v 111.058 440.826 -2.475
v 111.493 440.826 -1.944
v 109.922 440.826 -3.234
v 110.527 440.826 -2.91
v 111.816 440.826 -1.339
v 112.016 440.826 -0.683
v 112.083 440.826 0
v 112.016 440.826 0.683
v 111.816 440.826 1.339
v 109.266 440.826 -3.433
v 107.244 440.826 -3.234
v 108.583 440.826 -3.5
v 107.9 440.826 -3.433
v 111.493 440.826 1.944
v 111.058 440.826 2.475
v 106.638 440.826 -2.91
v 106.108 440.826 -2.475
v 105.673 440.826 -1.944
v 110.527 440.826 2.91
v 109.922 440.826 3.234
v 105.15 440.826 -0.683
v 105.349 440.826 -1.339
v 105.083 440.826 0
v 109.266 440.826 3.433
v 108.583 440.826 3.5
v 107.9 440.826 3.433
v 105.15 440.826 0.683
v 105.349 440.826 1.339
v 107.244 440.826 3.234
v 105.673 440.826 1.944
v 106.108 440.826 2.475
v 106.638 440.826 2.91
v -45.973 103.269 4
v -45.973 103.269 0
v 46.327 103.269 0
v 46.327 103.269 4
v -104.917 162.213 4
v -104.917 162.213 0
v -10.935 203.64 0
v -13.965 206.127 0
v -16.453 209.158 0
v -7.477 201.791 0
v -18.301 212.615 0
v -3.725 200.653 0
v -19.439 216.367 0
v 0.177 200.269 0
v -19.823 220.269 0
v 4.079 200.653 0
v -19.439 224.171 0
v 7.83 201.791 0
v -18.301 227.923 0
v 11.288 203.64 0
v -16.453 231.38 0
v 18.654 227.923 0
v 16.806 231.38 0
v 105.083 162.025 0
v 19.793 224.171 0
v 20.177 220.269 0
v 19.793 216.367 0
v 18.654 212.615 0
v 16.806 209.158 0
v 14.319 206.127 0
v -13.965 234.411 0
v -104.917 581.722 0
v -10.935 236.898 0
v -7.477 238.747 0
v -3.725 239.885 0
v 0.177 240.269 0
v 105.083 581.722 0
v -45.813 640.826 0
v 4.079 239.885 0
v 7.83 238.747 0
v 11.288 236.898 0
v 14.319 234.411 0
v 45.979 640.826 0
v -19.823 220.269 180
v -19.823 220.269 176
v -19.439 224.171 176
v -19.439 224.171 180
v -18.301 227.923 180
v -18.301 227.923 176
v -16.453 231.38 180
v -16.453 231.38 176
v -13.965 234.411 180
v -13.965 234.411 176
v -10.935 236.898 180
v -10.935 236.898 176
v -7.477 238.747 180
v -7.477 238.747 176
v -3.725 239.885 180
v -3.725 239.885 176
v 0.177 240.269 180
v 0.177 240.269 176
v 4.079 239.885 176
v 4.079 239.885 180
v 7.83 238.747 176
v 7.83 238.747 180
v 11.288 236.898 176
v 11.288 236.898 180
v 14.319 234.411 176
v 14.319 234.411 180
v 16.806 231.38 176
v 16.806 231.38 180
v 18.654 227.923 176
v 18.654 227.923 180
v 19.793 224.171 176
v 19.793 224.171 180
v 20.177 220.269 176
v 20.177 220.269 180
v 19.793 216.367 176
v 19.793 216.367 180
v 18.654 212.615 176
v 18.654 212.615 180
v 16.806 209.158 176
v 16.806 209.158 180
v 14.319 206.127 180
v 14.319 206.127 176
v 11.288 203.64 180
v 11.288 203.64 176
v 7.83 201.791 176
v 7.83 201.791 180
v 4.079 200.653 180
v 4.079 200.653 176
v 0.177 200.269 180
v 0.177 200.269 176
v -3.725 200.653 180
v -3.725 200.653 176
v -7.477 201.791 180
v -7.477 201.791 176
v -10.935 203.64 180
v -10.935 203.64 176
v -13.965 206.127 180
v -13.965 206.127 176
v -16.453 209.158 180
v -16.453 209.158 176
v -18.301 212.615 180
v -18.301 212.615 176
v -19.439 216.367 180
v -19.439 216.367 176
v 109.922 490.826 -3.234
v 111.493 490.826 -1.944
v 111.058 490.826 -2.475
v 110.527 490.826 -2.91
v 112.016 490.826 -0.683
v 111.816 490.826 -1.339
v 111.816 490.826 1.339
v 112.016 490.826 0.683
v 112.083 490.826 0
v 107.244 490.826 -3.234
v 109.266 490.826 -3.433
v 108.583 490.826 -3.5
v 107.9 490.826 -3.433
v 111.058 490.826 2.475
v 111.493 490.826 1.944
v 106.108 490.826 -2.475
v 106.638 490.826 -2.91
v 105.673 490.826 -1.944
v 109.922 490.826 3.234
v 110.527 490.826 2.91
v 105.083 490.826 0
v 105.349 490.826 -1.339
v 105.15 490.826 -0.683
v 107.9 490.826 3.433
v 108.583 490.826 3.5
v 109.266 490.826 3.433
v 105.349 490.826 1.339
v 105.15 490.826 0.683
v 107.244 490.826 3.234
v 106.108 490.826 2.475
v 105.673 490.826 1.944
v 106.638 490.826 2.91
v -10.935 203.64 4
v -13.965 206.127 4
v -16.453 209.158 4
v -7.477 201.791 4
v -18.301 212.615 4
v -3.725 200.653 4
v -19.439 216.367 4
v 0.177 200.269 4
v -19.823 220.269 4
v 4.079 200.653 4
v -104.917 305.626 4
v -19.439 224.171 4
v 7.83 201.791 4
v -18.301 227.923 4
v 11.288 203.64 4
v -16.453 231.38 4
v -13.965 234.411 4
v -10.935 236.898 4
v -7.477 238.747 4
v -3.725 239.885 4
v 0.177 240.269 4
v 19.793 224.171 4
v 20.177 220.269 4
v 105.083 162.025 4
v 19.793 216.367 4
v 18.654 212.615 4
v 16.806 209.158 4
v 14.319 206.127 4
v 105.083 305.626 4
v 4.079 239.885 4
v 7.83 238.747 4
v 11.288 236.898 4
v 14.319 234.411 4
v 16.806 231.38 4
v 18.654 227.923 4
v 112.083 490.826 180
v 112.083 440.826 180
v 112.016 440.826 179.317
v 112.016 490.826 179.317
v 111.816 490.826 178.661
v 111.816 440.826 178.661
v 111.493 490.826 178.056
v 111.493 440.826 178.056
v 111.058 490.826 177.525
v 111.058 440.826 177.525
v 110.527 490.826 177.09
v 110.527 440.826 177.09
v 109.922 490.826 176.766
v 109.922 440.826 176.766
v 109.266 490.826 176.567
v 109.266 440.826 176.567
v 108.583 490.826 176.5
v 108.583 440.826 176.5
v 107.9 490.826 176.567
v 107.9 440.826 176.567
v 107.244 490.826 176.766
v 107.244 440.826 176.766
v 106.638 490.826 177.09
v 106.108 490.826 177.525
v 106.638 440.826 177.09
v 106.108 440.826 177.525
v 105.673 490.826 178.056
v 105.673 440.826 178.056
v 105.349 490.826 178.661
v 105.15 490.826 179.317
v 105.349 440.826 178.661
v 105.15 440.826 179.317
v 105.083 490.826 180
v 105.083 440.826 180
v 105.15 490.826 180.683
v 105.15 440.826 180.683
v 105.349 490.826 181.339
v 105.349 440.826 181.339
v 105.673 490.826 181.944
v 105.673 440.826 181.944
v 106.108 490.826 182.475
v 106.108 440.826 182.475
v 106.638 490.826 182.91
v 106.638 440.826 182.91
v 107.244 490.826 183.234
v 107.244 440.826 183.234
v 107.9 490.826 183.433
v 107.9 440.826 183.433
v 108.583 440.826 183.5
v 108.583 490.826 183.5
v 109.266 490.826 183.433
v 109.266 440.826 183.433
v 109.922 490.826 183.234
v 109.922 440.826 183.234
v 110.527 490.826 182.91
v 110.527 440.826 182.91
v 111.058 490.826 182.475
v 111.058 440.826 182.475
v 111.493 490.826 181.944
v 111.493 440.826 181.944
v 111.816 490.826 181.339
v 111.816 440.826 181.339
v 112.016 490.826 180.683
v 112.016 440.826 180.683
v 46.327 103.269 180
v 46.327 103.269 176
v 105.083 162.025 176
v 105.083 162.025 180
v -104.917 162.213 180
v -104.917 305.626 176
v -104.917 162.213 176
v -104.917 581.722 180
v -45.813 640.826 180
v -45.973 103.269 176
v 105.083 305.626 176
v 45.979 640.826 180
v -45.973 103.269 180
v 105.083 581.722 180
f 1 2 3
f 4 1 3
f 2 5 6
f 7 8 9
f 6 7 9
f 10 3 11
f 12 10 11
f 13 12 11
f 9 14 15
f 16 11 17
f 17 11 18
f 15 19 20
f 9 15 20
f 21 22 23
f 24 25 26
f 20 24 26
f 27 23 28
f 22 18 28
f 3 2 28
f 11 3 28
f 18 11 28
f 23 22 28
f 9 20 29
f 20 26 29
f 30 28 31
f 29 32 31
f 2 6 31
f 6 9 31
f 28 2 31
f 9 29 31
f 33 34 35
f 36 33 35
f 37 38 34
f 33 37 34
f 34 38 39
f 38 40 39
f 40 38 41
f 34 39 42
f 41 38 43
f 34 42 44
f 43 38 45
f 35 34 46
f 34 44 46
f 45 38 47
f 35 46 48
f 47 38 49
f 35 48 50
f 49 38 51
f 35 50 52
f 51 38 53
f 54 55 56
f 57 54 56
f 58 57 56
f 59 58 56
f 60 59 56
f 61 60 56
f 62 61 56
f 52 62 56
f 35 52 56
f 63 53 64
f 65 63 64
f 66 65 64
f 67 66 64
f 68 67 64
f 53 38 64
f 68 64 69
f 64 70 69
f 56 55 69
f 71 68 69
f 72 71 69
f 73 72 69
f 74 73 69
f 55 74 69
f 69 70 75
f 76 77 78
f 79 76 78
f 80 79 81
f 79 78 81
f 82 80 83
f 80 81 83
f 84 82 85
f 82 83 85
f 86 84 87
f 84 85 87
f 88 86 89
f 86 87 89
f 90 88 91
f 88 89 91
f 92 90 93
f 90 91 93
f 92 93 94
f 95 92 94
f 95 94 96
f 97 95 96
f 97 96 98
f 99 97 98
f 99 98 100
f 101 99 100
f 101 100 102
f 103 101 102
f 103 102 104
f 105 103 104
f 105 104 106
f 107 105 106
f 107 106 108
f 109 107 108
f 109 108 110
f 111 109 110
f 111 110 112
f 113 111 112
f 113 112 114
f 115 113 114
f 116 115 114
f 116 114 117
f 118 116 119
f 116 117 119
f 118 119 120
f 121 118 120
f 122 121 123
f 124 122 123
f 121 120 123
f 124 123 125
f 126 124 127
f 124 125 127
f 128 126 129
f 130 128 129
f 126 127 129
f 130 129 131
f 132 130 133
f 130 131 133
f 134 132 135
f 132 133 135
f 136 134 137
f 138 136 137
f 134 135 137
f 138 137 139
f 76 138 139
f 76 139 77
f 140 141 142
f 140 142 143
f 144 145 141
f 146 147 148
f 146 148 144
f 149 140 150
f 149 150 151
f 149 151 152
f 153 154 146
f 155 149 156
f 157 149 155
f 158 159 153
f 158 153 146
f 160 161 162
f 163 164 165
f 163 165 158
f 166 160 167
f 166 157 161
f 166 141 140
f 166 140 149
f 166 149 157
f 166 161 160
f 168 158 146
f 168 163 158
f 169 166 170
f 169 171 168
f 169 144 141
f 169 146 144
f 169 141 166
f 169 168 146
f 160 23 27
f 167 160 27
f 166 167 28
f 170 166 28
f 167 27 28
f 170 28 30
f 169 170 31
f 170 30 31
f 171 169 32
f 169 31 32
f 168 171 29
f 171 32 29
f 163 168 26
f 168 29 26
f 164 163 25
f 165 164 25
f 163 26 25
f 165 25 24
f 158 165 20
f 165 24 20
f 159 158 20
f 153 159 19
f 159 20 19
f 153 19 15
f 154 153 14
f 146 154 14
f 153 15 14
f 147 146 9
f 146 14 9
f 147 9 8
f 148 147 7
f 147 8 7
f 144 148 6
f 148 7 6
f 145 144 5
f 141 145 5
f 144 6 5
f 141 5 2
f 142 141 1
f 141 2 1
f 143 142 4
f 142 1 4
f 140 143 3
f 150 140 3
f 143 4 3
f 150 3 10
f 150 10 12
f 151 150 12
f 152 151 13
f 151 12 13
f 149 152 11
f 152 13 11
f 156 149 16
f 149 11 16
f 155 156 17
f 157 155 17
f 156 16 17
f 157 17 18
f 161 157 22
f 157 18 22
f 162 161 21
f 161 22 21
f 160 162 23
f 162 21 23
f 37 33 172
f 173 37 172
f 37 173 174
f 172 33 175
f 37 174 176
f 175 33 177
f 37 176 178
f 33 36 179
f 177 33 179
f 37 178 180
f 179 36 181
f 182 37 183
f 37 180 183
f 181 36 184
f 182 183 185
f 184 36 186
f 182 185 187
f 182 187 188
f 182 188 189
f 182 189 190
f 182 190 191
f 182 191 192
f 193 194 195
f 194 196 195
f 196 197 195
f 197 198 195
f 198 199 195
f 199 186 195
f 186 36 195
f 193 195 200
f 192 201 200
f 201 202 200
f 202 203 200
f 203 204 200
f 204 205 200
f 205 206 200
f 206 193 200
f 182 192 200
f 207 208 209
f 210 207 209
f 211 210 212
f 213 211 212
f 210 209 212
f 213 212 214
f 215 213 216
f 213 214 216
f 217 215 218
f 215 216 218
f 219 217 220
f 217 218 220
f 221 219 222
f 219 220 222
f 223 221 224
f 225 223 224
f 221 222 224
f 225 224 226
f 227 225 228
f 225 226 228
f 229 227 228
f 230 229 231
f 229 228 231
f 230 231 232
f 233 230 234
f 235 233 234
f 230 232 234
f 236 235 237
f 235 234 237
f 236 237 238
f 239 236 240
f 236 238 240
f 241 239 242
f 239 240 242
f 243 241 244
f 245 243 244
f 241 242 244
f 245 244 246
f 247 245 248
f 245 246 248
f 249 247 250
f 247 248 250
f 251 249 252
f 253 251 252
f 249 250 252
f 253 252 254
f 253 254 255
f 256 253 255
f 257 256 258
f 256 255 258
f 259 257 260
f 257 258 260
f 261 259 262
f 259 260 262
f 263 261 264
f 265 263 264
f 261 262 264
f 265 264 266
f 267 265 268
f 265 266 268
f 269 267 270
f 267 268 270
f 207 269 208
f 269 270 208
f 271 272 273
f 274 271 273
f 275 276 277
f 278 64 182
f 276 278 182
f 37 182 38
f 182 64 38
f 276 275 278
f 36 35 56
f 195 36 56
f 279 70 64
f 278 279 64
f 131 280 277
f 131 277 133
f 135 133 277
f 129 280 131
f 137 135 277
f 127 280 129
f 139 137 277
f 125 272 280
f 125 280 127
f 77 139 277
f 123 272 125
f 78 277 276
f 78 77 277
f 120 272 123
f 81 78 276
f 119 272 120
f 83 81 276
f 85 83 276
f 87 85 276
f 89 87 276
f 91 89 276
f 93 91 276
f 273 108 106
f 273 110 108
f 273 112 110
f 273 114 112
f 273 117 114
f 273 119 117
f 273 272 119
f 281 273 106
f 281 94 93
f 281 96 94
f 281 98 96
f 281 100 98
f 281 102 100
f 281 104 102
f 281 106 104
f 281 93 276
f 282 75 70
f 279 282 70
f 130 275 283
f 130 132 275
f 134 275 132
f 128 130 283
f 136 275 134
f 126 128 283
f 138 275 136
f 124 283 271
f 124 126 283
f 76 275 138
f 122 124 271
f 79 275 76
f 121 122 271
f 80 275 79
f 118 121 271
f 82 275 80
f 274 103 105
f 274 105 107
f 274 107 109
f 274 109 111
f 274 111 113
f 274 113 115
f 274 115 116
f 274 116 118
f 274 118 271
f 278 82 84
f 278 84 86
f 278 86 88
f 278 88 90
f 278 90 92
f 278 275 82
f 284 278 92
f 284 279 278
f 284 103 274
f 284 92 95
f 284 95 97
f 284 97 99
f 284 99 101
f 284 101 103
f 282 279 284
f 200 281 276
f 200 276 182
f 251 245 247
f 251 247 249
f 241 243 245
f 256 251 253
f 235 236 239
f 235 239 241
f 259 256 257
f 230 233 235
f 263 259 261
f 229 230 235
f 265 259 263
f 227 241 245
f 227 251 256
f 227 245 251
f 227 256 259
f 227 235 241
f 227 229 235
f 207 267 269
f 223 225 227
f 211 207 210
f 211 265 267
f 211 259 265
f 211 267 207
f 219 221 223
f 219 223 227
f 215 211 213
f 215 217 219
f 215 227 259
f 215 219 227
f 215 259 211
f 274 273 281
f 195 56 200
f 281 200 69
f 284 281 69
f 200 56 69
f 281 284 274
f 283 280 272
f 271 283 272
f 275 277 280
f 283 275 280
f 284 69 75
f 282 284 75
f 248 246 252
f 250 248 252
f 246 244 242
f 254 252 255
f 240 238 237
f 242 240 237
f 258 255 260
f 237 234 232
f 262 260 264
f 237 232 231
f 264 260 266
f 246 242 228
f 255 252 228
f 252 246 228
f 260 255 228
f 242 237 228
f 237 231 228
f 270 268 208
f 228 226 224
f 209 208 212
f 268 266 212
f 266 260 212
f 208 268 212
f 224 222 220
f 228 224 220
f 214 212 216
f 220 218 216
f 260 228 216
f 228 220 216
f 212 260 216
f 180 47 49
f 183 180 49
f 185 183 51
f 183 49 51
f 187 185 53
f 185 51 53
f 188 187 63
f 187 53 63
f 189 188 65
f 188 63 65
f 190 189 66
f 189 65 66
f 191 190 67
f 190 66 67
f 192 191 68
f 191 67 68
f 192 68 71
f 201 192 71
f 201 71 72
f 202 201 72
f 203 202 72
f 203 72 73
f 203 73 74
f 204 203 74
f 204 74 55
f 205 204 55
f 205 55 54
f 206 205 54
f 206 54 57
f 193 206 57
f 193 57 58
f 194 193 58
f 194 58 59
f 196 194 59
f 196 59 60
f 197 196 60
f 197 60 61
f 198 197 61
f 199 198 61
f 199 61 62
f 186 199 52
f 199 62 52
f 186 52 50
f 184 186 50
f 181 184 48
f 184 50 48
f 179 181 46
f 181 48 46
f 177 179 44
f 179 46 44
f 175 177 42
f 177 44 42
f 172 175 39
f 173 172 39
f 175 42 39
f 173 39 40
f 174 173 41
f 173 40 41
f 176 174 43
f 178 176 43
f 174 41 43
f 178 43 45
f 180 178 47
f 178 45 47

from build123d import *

# Parameters (mm, degrees)
EXTRUDE_1_DEPTH       = 180
SKETCH1_W             = 172
SKETCH1_H             = 208.862338185
CUT_EXTRUDE1_DEPTH    = 698.966972306
SKETCH2_R             = 20
CUT_EXTRUDE2_DEPTH    = 674.869657154
SKETCH3_R             = 3.5
BOSS_EXTRUDE1_DEPTH   = 50
BOSS_EXTRUDE1_2_DEPTH = 50


with BuildPart() as part:
    # Эскиз1 → Вытянуть1 (new body)
    with BuildSketch(Plane.XY):
        Polygon((105.082921559, 581.722068254), (45.979042749, 640.825947064), (-45.813199631, 640.825947064), (-104.917078441, 581.722068254), (-104.917078441, 162.212880509), (-45.97317451, 103.268976578), (46.326817337, 103.268976578), (105.082921559, 162.0250808), align=None)
    extrude(amount=EXTRUDE_1_DEPTH)

    # Sketch1 → Cut-Extrude1 (cut, through all)
    with BuildSketch(Plane(origin=(105.082921559, 0, 0), x_dir=(0, 0, -1), z_dir=(1, 0, 0))):
        with Locations((-90, 201.194997681)):
            Rectangle(SKETCH1_W, SKETCH1_H)
    extrude(amount=-CUT_EXTRUDE1_DEPTH, mode=Mode.SUBTRACT)

    # Sketch2 → Cut-Extrude2 (cut, through all)
    with BuildSketch(Plane(origin=(0, 0, 0), x_dir=(-1, 0, 0), z_dir=(0, 0, -1))):
        with Locations((-0.176821413, 220.268976578)):
            Circle(SKETCH2_R)
    extrude(amount=-CUT_EXTRUDE2_DEPTH, mode=Mode.SUBTRACT)


with BuildPart() as body_2:
    # Sketch3 → Boss-Extrude1 (new body)
    with BuildSketch(Plane(origin=(0, 440.825947064, 0), x_dir=(1, 0, 0), z_dir=(0, 1, 0))):
        with Locations(Location((108.582921559, 0, 0), (0, 0, 180))):
            Circle(SKETCH3_R)
    extrude(amount=BOSS_EXTRUDE1_DEPTH)


with BuildPart() as body_3:
    # Sketch3 → Boss-Extrude1 2 (new body)
    with BuildSketch(Plane(origin=(0, 440.825947064, 0), x_dir=(1, 0, 0), z_dir=(0, 1, 0))):
        with Locations((108.582921559, -180)):
            Circle(SKETCH3_R)
    extrude(amount=BOSS_EXTRUDE1_2_DEPTH)


solid = Compound([part.part, body_2.part, body_3.part])
